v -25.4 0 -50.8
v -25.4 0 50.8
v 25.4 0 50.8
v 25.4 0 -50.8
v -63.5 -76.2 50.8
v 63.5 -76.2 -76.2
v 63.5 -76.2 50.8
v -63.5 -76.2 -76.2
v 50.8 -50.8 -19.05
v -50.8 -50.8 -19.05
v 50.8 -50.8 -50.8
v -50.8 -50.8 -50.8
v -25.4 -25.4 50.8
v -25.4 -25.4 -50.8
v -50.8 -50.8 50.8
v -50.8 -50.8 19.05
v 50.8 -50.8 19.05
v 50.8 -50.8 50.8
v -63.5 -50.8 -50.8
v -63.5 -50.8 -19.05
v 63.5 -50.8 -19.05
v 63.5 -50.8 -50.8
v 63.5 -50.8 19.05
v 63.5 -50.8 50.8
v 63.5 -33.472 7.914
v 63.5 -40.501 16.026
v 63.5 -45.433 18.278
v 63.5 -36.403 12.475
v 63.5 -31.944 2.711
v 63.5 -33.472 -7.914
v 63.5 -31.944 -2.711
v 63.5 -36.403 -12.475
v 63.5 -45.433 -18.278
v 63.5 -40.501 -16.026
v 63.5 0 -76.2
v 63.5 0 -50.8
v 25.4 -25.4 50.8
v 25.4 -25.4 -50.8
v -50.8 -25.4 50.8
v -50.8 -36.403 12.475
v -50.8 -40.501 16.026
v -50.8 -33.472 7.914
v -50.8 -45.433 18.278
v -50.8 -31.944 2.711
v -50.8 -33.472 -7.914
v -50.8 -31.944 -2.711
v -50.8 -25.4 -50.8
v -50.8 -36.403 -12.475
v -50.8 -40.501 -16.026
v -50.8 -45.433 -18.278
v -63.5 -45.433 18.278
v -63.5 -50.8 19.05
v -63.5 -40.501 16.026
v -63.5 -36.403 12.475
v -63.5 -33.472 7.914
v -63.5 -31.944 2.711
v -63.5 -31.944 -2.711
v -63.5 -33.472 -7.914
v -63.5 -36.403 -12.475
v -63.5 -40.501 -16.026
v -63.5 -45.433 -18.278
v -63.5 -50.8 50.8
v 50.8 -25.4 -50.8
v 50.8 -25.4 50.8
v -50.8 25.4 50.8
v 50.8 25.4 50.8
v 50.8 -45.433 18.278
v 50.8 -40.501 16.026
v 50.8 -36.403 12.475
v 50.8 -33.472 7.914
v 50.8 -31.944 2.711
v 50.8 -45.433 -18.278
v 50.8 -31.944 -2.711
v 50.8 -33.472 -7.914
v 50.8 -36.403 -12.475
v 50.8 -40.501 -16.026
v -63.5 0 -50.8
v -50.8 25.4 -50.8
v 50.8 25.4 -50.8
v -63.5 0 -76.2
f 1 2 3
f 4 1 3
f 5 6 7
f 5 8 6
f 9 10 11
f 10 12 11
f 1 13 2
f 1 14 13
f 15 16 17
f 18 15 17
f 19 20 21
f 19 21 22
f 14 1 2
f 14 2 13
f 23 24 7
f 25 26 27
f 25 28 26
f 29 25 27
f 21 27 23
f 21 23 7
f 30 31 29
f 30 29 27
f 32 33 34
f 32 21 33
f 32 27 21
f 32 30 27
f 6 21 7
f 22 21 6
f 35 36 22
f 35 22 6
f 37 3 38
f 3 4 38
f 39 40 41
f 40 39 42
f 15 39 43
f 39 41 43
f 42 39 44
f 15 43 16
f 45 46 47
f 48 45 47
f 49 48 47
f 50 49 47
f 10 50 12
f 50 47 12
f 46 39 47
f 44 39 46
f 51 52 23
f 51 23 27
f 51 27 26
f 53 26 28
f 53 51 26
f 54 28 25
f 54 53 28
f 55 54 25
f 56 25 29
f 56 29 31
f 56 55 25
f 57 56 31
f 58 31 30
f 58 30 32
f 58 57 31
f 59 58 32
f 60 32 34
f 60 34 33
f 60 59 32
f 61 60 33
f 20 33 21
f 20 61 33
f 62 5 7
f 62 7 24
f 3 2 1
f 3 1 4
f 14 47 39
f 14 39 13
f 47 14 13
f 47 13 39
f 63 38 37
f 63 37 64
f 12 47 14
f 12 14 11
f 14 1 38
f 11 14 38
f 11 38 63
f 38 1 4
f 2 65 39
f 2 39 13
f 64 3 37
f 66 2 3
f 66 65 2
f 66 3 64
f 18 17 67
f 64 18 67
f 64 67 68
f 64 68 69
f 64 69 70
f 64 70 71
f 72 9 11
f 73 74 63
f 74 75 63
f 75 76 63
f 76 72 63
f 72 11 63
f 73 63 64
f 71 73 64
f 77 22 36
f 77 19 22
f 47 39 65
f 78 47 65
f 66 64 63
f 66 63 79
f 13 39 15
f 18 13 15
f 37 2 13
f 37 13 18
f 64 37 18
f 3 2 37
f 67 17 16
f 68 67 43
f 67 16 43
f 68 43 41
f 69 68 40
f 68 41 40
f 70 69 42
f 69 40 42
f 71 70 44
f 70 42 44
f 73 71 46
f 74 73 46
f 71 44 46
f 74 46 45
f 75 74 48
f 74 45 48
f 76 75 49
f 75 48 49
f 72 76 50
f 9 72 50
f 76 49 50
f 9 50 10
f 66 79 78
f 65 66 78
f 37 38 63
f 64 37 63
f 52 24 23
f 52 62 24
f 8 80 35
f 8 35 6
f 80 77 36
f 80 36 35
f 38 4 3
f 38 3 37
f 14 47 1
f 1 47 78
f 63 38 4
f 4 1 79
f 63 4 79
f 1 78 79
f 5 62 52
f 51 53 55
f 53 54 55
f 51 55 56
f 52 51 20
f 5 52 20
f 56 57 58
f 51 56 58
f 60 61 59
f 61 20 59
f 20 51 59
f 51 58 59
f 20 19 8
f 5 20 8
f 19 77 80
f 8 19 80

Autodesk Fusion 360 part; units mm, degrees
sketch "Sketch1" plane through (0, 0, 0) normal (0, 0, 1) x (1, 0, 0) in component "Component"
  line L0 (0, 0) -> (25.4, 0)
  line L1 (25.4, 0) -> (25.4, -25.4)
  line L2 (25.4, -25.4) -> (50.8, -25.4)
  line L3 (50.8, -25.4) -> (50.8, 25.4)
  line L4 (50.8, 25.4) -> (0, 25.4)
  line L5 (0, 25.4) -> (0, 0)
  line L6 (-50.8, 25.4) -> (0, 25.4)
  line L7 (-50.8, -25.4) -> (-50.8, 25.4)
  line L8 (-25.4, -25.4) -> (-50.8, -25.4)
  line L9 (-25.4, 0) -> (-25.4, -25.4)
  line L10 (0, 0) -> (-25.4, 0)
  dimension "d1" = 25.4
  dimension "d2" = 25.4
  dimension "d3" = 25.4
  dimension "d4" = 50.8
extrude "Extrude1" add sketch "Sketch1" along normal mid plane 101.6 makes body 1 in component "Component"
sketch "Sketch1 (2)" plane through (0, 0, 0) normal (0, 0, 1) x (1, 0, 0) in component "Component'"
  line L0 (-25.4, -25.4) -> (-25.4, 0)
  line L1 (-25.4, 0) -> (25.4, 0)
  line L2 (25.4, 0) -> (25.4, -25.4)
  line L3 (-50.8, -25.4) -> (-25.4, -25.4)
  line L4 (25.4, -25.4) -> (50.8, -25.4)
  line L5 (-50.8, -25.4) -> (-50.8, -50.8)
  line L6 (-50.8, -50.8) -> (50.8, -50.8)
  line L7 (50.8, -50.8) -> (50.8, -25.4)
  dimension "d7" = 25.4
extrude "Extrude1'" add sketch "Sketch1 (2)" along normal mid plane 101.6 separate body makes body 2 in component "Component'"
sketch "Sketch2" plane through (0, 0, 0) normal (1, 0, 0) x (0, 0, -1) in component "Component'"
  circle A0 centre (0, -50.8) radius 19.05
  line L0 (50.8, -50.8) -> (-50.8, -50.8)
  dimension "d10" = 38.1
extrude "Extrude2" cut sketch "Sketch2" along normal mid plane 142.24 bodies 2 in component "Component'"
sketch "Sketch1 (3)" plane through (0, 0, 0) normal (1, 0, 0) x (0, 0, -1) in component "Component''"
  arc A0 (-19.05, -50.8) -> (19.05, -50.8) centre (0, -50.8) cw
  line L0 (19.05, -50.8) -> (50.8, -50.8)
  line L1 (-50.8, -50.8) -> (-19.05, -50.8)
  line L2 (50.8, -50.8) -> (50.8, 0)
  line L3 (50.8, 0) -> (76.2, 0)
  line L4 (76.2, 0) -> (76.2, -76.2)
  line L5 (76.2, -76.2) -> (-50.8, -76.2)
  line L6 (-50.8, -76.2) -> (-50.8, -50.8)
  point P0 (50.8, 0)
  dimension "d13" = 25.4
  dimension "d14" = 25.4
extrude "Extrude1''" add sketch "Sketch1 (3)" along normal mid plane 127 separate body makes body 3 in component "Component''"
component "Component" placed x (1, 0, 0) y (0, 1, 0) z (0, 0, 1) at (0, 0, 0)
component "Component'" placed x (1, 0, 0) y (0, 1, 0) z (0, 0, 1) at (0, 0, 0)
component "Component''" placed x (1, 0, 0) y (0, 1, 0) z (0, 0, 1) at (0, 0, 0)
